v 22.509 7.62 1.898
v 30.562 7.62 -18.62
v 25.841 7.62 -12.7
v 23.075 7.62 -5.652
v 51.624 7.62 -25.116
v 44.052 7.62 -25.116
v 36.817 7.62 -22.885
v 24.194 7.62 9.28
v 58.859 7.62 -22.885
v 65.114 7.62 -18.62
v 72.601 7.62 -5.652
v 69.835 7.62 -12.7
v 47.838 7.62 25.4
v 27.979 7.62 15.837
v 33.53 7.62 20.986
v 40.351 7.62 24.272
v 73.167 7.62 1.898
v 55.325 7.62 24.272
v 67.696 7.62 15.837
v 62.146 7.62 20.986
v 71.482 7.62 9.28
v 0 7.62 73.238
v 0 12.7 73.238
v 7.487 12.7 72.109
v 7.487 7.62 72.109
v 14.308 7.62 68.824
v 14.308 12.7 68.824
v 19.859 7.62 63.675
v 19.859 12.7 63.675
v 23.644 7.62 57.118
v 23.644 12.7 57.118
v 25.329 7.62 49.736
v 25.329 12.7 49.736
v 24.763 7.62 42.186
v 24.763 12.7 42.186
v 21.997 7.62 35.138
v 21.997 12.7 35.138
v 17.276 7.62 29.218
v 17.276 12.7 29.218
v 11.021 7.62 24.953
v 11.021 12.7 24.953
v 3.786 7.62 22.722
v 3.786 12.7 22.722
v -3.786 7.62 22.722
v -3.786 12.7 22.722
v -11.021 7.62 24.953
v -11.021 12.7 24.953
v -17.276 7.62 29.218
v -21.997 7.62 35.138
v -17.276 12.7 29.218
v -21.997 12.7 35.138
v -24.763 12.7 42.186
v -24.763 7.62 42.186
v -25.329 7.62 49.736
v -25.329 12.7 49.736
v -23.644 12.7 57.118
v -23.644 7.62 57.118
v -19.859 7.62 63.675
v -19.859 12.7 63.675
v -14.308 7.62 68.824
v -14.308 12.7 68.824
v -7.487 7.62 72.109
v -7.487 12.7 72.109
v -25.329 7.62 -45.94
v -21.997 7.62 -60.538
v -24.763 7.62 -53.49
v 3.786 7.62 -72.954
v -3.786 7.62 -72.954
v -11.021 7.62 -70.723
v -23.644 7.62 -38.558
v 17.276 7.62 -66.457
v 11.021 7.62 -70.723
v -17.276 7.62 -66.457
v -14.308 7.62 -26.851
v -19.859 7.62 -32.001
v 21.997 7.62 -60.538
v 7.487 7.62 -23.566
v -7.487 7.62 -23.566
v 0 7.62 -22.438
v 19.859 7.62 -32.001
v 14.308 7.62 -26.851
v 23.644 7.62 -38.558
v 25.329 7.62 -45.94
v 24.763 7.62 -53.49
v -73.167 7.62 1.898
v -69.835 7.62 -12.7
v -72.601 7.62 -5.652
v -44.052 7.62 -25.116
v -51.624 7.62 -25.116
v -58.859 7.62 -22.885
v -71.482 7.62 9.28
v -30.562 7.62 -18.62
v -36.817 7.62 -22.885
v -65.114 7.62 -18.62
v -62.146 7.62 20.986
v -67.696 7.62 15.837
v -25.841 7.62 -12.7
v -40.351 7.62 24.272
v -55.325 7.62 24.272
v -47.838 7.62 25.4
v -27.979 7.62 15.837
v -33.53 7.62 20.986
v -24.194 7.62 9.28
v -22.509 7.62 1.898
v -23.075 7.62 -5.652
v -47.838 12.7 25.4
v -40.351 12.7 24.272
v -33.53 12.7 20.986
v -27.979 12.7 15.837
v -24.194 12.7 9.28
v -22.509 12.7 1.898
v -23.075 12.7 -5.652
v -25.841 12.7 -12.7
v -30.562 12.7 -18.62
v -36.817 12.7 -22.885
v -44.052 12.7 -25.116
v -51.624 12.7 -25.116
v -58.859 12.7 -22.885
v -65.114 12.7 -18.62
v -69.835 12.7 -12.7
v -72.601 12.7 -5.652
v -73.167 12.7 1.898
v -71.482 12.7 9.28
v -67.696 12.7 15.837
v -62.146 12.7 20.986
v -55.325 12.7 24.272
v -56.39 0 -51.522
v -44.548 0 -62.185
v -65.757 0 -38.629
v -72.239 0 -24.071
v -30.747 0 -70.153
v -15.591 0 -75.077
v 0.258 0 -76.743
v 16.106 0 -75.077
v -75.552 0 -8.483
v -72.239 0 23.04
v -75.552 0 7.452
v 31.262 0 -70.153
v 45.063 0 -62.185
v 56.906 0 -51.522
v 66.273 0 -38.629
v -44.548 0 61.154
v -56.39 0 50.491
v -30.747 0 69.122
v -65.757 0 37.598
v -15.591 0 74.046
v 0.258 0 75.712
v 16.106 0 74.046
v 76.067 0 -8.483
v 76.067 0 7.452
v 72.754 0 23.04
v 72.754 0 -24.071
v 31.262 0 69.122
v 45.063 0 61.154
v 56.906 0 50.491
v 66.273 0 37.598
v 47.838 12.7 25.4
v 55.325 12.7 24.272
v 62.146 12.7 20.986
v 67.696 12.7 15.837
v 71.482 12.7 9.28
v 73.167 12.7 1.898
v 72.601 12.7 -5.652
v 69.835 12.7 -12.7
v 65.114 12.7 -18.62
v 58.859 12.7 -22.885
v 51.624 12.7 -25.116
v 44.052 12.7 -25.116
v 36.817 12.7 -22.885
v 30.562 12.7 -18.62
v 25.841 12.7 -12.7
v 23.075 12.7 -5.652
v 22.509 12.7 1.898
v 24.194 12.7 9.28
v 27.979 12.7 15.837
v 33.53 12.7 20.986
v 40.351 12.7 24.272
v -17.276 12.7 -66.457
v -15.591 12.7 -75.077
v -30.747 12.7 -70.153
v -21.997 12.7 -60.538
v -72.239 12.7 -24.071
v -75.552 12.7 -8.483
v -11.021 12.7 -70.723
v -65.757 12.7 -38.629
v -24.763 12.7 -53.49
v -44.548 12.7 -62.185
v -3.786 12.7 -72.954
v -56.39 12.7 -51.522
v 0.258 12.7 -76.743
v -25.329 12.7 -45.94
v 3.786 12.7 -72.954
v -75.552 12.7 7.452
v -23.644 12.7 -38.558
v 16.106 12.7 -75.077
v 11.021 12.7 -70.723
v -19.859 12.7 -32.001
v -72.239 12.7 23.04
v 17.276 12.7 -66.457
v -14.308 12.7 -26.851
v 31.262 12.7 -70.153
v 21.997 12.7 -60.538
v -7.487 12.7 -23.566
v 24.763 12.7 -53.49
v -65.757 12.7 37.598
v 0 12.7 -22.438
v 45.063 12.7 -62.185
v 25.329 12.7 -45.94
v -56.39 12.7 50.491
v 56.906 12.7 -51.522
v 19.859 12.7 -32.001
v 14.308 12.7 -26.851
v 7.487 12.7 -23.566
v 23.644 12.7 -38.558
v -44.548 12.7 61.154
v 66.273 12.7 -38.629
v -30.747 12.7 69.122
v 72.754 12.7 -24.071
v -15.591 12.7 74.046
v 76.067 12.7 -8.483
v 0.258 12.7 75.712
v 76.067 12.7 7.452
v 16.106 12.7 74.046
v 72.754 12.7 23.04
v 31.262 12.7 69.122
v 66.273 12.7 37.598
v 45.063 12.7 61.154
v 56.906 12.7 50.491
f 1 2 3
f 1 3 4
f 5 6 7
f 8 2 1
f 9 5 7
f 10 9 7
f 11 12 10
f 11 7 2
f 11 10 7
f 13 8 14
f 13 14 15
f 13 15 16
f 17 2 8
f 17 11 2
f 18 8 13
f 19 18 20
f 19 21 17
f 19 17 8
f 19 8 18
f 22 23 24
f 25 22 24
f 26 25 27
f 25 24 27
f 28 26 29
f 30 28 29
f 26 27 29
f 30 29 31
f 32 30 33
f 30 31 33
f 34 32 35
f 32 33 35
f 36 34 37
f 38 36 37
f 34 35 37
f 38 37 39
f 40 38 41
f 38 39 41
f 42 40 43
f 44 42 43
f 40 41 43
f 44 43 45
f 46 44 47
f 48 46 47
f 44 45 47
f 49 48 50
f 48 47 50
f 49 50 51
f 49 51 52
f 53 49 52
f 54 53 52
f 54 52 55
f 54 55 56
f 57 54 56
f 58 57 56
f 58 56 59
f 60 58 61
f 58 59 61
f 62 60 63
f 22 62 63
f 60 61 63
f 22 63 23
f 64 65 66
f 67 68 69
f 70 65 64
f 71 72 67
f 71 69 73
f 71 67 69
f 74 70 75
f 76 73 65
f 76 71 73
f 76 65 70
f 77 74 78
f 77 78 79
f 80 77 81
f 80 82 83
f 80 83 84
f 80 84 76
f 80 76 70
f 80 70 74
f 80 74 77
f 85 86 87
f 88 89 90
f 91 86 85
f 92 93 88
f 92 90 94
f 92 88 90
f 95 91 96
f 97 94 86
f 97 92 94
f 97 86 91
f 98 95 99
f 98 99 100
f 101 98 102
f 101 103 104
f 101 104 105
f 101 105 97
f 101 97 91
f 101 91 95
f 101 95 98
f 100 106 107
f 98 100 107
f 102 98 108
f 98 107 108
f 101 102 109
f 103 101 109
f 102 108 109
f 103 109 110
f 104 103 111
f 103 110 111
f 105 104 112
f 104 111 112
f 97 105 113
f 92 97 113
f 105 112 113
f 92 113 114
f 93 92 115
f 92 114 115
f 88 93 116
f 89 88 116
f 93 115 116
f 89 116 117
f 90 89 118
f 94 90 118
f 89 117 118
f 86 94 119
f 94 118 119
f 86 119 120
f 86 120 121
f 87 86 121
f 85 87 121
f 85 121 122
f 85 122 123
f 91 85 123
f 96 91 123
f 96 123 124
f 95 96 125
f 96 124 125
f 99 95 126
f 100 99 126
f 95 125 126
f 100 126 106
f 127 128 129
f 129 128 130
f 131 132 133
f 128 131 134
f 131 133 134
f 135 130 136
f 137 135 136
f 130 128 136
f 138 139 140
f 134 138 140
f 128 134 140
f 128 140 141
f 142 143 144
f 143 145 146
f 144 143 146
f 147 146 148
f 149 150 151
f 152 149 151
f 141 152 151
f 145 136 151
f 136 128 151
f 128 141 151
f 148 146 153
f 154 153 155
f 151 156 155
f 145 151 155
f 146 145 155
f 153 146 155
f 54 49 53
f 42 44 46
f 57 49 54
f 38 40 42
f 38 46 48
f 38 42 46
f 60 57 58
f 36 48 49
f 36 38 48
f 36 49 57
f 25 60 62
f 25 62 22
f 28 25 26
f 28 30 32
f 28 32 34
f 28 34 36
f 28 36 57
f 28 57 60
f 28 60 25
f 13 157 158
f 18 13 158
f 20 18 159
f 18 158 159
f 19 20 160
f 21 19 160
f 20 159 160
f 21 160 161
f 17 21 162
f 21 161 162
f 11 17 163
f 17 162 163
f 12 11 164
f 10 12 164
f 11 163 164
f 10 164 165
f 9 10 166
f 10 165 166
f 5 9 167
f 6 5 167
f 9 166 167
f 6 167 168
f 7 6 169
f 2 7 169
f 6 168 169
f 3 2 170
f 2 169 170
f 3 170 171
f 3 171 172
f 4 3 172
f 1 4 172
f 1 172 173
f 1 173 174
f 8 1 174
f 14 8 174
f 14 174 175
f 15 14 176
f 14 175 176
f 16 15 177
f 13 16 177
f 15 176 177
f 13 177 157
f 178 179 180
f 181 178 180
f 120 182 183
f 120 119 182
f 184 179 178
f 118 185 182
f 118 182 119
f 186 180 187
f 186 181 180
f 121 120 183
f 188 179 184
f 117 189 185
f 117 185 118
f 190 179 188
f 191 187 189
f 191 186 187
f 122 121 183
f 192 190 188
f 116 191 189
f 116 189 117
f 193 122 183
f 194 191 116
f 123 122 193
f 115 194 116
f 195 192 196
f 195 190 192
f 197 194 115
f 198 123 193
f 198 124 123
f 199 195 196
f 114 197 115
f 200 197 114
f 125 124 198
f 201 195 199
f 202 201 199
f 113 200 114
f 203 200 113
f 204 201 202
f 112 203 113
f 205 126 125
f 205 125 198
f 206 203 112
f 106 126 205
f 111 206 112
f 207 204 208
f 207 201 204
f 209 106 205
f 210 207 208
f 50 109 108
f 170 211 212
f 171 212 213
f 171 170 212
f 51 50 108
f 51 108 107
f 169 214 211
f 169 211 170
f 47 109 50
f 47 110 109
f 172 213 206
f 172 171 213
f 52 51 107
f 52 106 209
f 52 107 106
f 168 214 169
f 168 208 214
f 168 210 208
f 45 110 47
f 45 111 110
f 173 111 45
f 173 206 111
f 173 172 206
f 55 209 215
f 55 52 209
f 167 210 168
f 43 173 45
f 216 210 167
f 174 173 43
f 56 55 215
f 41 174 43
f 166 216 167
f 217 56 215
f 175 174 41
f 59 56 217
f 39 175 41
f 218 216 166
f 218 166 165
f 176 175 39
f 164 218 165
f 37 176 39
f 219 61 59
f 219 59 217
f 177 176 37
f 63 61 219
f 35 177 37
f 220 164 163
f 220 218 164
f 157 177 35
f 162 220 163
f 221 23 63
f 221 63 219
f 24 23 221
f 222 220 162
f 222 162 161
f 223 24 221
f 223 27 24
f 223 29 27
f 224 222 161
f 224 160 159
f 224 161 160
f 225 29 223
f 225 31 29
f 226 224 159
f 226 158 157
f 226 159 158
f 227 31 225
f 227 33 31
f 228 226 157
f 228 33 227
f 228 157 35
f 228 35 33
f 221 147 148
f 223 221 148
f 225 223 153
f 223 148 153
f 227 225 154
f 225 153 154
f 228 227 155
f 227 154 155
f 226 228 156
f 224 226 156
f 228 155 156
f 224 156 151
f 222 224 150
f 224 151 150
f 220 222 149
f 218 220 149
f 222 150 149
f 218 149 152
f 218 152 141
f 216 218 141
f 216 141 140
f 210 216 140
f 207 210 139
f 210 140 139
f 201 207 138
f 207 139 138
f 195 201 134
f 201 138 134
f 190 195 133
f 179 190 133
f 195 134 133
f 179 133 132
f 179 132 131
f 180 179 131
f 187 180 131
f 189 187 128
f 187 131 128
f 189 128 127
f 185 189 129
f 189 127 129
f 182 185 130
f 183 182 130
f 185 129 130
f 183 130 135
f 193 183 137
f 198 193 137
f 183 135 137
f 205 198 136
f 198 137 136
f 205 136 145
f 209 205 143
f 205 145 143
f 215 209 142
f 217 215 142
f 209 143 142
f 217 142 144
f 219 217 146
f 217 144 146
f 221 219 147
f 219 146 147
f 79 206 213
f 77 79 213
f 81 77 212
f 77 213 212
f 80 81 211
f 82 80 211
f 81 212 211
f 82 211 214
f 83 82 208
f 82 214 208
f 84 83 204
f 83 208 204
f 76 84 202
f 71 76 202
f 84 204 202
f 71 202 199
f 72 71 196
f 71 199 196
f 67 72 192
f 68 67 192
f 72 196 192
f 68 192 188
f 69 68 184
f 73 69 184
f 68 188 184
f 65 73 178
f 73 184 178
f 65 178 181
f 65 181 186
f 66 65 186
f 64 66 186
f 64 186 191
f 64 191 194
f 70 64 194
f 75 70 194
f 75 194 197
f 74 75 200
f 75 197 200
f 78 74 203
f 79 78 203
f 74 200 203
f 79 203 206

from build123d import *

# Parameters (mm, degrees)
SKETCH1_R           = 76.227284409
BOSS_EXTRUDE1_DEPTH = 12.7
SKETCH5_R           = 25.4
CUT_EXTRUDE2_DEPTH  = 5.08
SKETCH7_R           = 25.4
CUT_EXTRUDE4_DEPTH  = 5.08


with BuildPart() as part:
    # Sketch1 → Boss-Extrude1 (new body)
    with BuildSketch(Plane(origin=(0, 0, 0), x_dir=(1, 0, 0), z_dir=(0, 1, 0))):
        with Locations(Location((0.257754177, 0.515508354, 0), (0, 0, 270))):
            Circle(SKETCH1_R)
    extrude(amount=BOSS_EXTRUDE1_DEPTH)

    # Sketch5 → Cut-Extrude2 (cut)
    with BuildSketch(Plane(origin=(0, 12.7, 0), x_dir=(1, 0, 0), z_dir=(0, 1, 0))):
        with Locations(Location((-47.837919056, 0, 0), (0, 0, 270))):
            Circle(SKETCH5_R)
    extrude(amount=-CUT_EXTRUDE2_DEPTH, mode=Mode.SUBTRACT)

    # Sketch7 → Cut-Extrude4 (cut)
    with BuildSketch(Plane(origin=(0, 12.7, 0), x_dir=(1, 0, 0), z_dir=(0, 1, 0))):
        with Locations(Location((0, 47.837919056, 0), (0, 0, 270))):
            Circle(SKETCH7_R)
        with Locations(Location((47.837919056, 0, 0), (0, 0, 270))):
            Circle(SKETCH7_R)
        with Locations(Location((0, -47.837919056, 0), (0, 0, 270))):
            Circle(SKETCH7_R)
    extrude(amount=-CUT_EXTRUDE4_DEPTH, mode=Mode.SUBTRACT)


solid = part.part
